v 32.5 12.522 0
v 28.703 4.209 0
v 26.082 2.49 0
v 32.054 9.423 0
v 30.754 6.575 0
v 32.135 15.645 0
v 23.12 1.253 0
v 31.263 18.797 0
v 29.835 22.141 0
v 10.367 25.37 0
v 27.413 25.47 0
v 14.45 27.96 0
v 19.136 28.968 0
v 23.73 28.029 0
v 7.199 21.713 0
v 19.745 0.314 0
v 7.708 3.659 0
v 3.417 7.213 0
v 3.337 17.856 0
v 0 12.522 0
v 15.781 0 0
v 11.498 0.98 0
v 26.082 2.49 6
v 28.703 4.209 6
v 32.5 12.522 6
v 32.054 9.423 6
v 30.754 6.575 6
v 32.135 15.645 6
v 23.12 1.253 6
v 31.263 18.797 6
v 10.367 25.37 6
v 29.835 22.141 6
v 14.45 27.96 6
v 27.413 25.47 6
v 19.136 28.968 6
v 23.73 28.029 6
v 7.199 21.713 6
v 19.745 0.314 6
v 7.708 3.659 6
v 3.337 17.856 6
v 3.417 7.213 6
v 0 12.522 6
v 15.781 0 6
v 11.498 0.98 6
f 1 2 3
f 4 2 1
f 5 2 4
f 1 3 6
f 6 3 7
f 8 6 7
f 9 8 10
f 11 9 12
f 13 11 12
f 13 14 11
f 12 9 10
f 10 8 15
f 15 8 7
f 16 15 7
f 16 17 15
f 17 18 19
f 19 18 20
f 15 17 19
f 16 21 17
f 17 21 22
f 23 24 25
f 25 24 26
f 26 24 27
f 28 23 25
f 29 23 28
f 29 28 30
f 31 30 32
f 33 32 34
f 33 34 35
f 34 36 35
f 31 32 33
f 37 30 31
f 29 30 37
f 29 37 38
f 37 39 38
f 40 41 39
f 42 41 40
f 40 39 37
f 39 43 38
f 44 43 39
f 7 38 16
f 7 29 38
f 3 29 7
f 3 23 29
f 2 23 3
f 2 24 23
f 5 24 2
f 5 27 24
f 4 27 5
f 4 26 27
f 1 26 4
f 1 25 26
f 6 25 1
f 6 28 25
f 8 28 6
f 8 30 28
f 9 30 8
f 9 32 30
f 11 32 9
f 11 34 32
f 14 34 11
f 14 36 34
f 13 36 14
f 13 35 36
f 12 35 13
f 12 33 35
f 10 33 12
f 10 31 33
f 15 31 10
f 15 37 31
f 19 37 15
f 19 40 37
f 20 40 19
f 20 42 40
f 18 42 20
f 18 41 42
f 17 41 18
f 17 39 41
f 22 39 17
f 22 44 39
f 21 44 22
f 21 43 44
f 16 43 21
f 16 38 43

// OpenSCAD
$fn = 32;

// ----------------------------------------------------------------------
// Cam disc: base radius 11.0 mm, lift 6.0 mm, 22 profile points
// ----------------------------------------------------------------------

// --- parameters (mm) ---
profile_height = 6;       // extrusion height
profile_points = 22;      // points of the closed outline

profile = [[32.5, 12.522], [32.135, 15.645], [31.263, 18.797], [29.835, 22.141], [27.413, 25.47], [23.73, 28.029], [19.136, 28.968], [14.45, 27.96], [10.367, 25.37], [7.199, 21.713], [3.337, 17.856], [0, 12.522], [3.417, 7.213], [7.708, 3.659], [11.498, 0.98], [15.781, 0], [19.745, 0.314], [23.12, 1.253], [26.082, 2.49], [28.703, 4.209], [30.754, 6.575], [32.054, 9.423]];  // single closed polygon, 22 points, counter clockwise

// --- the one profile operation ---
linear_extrude(height = profile_height) polygon(points = profile);
